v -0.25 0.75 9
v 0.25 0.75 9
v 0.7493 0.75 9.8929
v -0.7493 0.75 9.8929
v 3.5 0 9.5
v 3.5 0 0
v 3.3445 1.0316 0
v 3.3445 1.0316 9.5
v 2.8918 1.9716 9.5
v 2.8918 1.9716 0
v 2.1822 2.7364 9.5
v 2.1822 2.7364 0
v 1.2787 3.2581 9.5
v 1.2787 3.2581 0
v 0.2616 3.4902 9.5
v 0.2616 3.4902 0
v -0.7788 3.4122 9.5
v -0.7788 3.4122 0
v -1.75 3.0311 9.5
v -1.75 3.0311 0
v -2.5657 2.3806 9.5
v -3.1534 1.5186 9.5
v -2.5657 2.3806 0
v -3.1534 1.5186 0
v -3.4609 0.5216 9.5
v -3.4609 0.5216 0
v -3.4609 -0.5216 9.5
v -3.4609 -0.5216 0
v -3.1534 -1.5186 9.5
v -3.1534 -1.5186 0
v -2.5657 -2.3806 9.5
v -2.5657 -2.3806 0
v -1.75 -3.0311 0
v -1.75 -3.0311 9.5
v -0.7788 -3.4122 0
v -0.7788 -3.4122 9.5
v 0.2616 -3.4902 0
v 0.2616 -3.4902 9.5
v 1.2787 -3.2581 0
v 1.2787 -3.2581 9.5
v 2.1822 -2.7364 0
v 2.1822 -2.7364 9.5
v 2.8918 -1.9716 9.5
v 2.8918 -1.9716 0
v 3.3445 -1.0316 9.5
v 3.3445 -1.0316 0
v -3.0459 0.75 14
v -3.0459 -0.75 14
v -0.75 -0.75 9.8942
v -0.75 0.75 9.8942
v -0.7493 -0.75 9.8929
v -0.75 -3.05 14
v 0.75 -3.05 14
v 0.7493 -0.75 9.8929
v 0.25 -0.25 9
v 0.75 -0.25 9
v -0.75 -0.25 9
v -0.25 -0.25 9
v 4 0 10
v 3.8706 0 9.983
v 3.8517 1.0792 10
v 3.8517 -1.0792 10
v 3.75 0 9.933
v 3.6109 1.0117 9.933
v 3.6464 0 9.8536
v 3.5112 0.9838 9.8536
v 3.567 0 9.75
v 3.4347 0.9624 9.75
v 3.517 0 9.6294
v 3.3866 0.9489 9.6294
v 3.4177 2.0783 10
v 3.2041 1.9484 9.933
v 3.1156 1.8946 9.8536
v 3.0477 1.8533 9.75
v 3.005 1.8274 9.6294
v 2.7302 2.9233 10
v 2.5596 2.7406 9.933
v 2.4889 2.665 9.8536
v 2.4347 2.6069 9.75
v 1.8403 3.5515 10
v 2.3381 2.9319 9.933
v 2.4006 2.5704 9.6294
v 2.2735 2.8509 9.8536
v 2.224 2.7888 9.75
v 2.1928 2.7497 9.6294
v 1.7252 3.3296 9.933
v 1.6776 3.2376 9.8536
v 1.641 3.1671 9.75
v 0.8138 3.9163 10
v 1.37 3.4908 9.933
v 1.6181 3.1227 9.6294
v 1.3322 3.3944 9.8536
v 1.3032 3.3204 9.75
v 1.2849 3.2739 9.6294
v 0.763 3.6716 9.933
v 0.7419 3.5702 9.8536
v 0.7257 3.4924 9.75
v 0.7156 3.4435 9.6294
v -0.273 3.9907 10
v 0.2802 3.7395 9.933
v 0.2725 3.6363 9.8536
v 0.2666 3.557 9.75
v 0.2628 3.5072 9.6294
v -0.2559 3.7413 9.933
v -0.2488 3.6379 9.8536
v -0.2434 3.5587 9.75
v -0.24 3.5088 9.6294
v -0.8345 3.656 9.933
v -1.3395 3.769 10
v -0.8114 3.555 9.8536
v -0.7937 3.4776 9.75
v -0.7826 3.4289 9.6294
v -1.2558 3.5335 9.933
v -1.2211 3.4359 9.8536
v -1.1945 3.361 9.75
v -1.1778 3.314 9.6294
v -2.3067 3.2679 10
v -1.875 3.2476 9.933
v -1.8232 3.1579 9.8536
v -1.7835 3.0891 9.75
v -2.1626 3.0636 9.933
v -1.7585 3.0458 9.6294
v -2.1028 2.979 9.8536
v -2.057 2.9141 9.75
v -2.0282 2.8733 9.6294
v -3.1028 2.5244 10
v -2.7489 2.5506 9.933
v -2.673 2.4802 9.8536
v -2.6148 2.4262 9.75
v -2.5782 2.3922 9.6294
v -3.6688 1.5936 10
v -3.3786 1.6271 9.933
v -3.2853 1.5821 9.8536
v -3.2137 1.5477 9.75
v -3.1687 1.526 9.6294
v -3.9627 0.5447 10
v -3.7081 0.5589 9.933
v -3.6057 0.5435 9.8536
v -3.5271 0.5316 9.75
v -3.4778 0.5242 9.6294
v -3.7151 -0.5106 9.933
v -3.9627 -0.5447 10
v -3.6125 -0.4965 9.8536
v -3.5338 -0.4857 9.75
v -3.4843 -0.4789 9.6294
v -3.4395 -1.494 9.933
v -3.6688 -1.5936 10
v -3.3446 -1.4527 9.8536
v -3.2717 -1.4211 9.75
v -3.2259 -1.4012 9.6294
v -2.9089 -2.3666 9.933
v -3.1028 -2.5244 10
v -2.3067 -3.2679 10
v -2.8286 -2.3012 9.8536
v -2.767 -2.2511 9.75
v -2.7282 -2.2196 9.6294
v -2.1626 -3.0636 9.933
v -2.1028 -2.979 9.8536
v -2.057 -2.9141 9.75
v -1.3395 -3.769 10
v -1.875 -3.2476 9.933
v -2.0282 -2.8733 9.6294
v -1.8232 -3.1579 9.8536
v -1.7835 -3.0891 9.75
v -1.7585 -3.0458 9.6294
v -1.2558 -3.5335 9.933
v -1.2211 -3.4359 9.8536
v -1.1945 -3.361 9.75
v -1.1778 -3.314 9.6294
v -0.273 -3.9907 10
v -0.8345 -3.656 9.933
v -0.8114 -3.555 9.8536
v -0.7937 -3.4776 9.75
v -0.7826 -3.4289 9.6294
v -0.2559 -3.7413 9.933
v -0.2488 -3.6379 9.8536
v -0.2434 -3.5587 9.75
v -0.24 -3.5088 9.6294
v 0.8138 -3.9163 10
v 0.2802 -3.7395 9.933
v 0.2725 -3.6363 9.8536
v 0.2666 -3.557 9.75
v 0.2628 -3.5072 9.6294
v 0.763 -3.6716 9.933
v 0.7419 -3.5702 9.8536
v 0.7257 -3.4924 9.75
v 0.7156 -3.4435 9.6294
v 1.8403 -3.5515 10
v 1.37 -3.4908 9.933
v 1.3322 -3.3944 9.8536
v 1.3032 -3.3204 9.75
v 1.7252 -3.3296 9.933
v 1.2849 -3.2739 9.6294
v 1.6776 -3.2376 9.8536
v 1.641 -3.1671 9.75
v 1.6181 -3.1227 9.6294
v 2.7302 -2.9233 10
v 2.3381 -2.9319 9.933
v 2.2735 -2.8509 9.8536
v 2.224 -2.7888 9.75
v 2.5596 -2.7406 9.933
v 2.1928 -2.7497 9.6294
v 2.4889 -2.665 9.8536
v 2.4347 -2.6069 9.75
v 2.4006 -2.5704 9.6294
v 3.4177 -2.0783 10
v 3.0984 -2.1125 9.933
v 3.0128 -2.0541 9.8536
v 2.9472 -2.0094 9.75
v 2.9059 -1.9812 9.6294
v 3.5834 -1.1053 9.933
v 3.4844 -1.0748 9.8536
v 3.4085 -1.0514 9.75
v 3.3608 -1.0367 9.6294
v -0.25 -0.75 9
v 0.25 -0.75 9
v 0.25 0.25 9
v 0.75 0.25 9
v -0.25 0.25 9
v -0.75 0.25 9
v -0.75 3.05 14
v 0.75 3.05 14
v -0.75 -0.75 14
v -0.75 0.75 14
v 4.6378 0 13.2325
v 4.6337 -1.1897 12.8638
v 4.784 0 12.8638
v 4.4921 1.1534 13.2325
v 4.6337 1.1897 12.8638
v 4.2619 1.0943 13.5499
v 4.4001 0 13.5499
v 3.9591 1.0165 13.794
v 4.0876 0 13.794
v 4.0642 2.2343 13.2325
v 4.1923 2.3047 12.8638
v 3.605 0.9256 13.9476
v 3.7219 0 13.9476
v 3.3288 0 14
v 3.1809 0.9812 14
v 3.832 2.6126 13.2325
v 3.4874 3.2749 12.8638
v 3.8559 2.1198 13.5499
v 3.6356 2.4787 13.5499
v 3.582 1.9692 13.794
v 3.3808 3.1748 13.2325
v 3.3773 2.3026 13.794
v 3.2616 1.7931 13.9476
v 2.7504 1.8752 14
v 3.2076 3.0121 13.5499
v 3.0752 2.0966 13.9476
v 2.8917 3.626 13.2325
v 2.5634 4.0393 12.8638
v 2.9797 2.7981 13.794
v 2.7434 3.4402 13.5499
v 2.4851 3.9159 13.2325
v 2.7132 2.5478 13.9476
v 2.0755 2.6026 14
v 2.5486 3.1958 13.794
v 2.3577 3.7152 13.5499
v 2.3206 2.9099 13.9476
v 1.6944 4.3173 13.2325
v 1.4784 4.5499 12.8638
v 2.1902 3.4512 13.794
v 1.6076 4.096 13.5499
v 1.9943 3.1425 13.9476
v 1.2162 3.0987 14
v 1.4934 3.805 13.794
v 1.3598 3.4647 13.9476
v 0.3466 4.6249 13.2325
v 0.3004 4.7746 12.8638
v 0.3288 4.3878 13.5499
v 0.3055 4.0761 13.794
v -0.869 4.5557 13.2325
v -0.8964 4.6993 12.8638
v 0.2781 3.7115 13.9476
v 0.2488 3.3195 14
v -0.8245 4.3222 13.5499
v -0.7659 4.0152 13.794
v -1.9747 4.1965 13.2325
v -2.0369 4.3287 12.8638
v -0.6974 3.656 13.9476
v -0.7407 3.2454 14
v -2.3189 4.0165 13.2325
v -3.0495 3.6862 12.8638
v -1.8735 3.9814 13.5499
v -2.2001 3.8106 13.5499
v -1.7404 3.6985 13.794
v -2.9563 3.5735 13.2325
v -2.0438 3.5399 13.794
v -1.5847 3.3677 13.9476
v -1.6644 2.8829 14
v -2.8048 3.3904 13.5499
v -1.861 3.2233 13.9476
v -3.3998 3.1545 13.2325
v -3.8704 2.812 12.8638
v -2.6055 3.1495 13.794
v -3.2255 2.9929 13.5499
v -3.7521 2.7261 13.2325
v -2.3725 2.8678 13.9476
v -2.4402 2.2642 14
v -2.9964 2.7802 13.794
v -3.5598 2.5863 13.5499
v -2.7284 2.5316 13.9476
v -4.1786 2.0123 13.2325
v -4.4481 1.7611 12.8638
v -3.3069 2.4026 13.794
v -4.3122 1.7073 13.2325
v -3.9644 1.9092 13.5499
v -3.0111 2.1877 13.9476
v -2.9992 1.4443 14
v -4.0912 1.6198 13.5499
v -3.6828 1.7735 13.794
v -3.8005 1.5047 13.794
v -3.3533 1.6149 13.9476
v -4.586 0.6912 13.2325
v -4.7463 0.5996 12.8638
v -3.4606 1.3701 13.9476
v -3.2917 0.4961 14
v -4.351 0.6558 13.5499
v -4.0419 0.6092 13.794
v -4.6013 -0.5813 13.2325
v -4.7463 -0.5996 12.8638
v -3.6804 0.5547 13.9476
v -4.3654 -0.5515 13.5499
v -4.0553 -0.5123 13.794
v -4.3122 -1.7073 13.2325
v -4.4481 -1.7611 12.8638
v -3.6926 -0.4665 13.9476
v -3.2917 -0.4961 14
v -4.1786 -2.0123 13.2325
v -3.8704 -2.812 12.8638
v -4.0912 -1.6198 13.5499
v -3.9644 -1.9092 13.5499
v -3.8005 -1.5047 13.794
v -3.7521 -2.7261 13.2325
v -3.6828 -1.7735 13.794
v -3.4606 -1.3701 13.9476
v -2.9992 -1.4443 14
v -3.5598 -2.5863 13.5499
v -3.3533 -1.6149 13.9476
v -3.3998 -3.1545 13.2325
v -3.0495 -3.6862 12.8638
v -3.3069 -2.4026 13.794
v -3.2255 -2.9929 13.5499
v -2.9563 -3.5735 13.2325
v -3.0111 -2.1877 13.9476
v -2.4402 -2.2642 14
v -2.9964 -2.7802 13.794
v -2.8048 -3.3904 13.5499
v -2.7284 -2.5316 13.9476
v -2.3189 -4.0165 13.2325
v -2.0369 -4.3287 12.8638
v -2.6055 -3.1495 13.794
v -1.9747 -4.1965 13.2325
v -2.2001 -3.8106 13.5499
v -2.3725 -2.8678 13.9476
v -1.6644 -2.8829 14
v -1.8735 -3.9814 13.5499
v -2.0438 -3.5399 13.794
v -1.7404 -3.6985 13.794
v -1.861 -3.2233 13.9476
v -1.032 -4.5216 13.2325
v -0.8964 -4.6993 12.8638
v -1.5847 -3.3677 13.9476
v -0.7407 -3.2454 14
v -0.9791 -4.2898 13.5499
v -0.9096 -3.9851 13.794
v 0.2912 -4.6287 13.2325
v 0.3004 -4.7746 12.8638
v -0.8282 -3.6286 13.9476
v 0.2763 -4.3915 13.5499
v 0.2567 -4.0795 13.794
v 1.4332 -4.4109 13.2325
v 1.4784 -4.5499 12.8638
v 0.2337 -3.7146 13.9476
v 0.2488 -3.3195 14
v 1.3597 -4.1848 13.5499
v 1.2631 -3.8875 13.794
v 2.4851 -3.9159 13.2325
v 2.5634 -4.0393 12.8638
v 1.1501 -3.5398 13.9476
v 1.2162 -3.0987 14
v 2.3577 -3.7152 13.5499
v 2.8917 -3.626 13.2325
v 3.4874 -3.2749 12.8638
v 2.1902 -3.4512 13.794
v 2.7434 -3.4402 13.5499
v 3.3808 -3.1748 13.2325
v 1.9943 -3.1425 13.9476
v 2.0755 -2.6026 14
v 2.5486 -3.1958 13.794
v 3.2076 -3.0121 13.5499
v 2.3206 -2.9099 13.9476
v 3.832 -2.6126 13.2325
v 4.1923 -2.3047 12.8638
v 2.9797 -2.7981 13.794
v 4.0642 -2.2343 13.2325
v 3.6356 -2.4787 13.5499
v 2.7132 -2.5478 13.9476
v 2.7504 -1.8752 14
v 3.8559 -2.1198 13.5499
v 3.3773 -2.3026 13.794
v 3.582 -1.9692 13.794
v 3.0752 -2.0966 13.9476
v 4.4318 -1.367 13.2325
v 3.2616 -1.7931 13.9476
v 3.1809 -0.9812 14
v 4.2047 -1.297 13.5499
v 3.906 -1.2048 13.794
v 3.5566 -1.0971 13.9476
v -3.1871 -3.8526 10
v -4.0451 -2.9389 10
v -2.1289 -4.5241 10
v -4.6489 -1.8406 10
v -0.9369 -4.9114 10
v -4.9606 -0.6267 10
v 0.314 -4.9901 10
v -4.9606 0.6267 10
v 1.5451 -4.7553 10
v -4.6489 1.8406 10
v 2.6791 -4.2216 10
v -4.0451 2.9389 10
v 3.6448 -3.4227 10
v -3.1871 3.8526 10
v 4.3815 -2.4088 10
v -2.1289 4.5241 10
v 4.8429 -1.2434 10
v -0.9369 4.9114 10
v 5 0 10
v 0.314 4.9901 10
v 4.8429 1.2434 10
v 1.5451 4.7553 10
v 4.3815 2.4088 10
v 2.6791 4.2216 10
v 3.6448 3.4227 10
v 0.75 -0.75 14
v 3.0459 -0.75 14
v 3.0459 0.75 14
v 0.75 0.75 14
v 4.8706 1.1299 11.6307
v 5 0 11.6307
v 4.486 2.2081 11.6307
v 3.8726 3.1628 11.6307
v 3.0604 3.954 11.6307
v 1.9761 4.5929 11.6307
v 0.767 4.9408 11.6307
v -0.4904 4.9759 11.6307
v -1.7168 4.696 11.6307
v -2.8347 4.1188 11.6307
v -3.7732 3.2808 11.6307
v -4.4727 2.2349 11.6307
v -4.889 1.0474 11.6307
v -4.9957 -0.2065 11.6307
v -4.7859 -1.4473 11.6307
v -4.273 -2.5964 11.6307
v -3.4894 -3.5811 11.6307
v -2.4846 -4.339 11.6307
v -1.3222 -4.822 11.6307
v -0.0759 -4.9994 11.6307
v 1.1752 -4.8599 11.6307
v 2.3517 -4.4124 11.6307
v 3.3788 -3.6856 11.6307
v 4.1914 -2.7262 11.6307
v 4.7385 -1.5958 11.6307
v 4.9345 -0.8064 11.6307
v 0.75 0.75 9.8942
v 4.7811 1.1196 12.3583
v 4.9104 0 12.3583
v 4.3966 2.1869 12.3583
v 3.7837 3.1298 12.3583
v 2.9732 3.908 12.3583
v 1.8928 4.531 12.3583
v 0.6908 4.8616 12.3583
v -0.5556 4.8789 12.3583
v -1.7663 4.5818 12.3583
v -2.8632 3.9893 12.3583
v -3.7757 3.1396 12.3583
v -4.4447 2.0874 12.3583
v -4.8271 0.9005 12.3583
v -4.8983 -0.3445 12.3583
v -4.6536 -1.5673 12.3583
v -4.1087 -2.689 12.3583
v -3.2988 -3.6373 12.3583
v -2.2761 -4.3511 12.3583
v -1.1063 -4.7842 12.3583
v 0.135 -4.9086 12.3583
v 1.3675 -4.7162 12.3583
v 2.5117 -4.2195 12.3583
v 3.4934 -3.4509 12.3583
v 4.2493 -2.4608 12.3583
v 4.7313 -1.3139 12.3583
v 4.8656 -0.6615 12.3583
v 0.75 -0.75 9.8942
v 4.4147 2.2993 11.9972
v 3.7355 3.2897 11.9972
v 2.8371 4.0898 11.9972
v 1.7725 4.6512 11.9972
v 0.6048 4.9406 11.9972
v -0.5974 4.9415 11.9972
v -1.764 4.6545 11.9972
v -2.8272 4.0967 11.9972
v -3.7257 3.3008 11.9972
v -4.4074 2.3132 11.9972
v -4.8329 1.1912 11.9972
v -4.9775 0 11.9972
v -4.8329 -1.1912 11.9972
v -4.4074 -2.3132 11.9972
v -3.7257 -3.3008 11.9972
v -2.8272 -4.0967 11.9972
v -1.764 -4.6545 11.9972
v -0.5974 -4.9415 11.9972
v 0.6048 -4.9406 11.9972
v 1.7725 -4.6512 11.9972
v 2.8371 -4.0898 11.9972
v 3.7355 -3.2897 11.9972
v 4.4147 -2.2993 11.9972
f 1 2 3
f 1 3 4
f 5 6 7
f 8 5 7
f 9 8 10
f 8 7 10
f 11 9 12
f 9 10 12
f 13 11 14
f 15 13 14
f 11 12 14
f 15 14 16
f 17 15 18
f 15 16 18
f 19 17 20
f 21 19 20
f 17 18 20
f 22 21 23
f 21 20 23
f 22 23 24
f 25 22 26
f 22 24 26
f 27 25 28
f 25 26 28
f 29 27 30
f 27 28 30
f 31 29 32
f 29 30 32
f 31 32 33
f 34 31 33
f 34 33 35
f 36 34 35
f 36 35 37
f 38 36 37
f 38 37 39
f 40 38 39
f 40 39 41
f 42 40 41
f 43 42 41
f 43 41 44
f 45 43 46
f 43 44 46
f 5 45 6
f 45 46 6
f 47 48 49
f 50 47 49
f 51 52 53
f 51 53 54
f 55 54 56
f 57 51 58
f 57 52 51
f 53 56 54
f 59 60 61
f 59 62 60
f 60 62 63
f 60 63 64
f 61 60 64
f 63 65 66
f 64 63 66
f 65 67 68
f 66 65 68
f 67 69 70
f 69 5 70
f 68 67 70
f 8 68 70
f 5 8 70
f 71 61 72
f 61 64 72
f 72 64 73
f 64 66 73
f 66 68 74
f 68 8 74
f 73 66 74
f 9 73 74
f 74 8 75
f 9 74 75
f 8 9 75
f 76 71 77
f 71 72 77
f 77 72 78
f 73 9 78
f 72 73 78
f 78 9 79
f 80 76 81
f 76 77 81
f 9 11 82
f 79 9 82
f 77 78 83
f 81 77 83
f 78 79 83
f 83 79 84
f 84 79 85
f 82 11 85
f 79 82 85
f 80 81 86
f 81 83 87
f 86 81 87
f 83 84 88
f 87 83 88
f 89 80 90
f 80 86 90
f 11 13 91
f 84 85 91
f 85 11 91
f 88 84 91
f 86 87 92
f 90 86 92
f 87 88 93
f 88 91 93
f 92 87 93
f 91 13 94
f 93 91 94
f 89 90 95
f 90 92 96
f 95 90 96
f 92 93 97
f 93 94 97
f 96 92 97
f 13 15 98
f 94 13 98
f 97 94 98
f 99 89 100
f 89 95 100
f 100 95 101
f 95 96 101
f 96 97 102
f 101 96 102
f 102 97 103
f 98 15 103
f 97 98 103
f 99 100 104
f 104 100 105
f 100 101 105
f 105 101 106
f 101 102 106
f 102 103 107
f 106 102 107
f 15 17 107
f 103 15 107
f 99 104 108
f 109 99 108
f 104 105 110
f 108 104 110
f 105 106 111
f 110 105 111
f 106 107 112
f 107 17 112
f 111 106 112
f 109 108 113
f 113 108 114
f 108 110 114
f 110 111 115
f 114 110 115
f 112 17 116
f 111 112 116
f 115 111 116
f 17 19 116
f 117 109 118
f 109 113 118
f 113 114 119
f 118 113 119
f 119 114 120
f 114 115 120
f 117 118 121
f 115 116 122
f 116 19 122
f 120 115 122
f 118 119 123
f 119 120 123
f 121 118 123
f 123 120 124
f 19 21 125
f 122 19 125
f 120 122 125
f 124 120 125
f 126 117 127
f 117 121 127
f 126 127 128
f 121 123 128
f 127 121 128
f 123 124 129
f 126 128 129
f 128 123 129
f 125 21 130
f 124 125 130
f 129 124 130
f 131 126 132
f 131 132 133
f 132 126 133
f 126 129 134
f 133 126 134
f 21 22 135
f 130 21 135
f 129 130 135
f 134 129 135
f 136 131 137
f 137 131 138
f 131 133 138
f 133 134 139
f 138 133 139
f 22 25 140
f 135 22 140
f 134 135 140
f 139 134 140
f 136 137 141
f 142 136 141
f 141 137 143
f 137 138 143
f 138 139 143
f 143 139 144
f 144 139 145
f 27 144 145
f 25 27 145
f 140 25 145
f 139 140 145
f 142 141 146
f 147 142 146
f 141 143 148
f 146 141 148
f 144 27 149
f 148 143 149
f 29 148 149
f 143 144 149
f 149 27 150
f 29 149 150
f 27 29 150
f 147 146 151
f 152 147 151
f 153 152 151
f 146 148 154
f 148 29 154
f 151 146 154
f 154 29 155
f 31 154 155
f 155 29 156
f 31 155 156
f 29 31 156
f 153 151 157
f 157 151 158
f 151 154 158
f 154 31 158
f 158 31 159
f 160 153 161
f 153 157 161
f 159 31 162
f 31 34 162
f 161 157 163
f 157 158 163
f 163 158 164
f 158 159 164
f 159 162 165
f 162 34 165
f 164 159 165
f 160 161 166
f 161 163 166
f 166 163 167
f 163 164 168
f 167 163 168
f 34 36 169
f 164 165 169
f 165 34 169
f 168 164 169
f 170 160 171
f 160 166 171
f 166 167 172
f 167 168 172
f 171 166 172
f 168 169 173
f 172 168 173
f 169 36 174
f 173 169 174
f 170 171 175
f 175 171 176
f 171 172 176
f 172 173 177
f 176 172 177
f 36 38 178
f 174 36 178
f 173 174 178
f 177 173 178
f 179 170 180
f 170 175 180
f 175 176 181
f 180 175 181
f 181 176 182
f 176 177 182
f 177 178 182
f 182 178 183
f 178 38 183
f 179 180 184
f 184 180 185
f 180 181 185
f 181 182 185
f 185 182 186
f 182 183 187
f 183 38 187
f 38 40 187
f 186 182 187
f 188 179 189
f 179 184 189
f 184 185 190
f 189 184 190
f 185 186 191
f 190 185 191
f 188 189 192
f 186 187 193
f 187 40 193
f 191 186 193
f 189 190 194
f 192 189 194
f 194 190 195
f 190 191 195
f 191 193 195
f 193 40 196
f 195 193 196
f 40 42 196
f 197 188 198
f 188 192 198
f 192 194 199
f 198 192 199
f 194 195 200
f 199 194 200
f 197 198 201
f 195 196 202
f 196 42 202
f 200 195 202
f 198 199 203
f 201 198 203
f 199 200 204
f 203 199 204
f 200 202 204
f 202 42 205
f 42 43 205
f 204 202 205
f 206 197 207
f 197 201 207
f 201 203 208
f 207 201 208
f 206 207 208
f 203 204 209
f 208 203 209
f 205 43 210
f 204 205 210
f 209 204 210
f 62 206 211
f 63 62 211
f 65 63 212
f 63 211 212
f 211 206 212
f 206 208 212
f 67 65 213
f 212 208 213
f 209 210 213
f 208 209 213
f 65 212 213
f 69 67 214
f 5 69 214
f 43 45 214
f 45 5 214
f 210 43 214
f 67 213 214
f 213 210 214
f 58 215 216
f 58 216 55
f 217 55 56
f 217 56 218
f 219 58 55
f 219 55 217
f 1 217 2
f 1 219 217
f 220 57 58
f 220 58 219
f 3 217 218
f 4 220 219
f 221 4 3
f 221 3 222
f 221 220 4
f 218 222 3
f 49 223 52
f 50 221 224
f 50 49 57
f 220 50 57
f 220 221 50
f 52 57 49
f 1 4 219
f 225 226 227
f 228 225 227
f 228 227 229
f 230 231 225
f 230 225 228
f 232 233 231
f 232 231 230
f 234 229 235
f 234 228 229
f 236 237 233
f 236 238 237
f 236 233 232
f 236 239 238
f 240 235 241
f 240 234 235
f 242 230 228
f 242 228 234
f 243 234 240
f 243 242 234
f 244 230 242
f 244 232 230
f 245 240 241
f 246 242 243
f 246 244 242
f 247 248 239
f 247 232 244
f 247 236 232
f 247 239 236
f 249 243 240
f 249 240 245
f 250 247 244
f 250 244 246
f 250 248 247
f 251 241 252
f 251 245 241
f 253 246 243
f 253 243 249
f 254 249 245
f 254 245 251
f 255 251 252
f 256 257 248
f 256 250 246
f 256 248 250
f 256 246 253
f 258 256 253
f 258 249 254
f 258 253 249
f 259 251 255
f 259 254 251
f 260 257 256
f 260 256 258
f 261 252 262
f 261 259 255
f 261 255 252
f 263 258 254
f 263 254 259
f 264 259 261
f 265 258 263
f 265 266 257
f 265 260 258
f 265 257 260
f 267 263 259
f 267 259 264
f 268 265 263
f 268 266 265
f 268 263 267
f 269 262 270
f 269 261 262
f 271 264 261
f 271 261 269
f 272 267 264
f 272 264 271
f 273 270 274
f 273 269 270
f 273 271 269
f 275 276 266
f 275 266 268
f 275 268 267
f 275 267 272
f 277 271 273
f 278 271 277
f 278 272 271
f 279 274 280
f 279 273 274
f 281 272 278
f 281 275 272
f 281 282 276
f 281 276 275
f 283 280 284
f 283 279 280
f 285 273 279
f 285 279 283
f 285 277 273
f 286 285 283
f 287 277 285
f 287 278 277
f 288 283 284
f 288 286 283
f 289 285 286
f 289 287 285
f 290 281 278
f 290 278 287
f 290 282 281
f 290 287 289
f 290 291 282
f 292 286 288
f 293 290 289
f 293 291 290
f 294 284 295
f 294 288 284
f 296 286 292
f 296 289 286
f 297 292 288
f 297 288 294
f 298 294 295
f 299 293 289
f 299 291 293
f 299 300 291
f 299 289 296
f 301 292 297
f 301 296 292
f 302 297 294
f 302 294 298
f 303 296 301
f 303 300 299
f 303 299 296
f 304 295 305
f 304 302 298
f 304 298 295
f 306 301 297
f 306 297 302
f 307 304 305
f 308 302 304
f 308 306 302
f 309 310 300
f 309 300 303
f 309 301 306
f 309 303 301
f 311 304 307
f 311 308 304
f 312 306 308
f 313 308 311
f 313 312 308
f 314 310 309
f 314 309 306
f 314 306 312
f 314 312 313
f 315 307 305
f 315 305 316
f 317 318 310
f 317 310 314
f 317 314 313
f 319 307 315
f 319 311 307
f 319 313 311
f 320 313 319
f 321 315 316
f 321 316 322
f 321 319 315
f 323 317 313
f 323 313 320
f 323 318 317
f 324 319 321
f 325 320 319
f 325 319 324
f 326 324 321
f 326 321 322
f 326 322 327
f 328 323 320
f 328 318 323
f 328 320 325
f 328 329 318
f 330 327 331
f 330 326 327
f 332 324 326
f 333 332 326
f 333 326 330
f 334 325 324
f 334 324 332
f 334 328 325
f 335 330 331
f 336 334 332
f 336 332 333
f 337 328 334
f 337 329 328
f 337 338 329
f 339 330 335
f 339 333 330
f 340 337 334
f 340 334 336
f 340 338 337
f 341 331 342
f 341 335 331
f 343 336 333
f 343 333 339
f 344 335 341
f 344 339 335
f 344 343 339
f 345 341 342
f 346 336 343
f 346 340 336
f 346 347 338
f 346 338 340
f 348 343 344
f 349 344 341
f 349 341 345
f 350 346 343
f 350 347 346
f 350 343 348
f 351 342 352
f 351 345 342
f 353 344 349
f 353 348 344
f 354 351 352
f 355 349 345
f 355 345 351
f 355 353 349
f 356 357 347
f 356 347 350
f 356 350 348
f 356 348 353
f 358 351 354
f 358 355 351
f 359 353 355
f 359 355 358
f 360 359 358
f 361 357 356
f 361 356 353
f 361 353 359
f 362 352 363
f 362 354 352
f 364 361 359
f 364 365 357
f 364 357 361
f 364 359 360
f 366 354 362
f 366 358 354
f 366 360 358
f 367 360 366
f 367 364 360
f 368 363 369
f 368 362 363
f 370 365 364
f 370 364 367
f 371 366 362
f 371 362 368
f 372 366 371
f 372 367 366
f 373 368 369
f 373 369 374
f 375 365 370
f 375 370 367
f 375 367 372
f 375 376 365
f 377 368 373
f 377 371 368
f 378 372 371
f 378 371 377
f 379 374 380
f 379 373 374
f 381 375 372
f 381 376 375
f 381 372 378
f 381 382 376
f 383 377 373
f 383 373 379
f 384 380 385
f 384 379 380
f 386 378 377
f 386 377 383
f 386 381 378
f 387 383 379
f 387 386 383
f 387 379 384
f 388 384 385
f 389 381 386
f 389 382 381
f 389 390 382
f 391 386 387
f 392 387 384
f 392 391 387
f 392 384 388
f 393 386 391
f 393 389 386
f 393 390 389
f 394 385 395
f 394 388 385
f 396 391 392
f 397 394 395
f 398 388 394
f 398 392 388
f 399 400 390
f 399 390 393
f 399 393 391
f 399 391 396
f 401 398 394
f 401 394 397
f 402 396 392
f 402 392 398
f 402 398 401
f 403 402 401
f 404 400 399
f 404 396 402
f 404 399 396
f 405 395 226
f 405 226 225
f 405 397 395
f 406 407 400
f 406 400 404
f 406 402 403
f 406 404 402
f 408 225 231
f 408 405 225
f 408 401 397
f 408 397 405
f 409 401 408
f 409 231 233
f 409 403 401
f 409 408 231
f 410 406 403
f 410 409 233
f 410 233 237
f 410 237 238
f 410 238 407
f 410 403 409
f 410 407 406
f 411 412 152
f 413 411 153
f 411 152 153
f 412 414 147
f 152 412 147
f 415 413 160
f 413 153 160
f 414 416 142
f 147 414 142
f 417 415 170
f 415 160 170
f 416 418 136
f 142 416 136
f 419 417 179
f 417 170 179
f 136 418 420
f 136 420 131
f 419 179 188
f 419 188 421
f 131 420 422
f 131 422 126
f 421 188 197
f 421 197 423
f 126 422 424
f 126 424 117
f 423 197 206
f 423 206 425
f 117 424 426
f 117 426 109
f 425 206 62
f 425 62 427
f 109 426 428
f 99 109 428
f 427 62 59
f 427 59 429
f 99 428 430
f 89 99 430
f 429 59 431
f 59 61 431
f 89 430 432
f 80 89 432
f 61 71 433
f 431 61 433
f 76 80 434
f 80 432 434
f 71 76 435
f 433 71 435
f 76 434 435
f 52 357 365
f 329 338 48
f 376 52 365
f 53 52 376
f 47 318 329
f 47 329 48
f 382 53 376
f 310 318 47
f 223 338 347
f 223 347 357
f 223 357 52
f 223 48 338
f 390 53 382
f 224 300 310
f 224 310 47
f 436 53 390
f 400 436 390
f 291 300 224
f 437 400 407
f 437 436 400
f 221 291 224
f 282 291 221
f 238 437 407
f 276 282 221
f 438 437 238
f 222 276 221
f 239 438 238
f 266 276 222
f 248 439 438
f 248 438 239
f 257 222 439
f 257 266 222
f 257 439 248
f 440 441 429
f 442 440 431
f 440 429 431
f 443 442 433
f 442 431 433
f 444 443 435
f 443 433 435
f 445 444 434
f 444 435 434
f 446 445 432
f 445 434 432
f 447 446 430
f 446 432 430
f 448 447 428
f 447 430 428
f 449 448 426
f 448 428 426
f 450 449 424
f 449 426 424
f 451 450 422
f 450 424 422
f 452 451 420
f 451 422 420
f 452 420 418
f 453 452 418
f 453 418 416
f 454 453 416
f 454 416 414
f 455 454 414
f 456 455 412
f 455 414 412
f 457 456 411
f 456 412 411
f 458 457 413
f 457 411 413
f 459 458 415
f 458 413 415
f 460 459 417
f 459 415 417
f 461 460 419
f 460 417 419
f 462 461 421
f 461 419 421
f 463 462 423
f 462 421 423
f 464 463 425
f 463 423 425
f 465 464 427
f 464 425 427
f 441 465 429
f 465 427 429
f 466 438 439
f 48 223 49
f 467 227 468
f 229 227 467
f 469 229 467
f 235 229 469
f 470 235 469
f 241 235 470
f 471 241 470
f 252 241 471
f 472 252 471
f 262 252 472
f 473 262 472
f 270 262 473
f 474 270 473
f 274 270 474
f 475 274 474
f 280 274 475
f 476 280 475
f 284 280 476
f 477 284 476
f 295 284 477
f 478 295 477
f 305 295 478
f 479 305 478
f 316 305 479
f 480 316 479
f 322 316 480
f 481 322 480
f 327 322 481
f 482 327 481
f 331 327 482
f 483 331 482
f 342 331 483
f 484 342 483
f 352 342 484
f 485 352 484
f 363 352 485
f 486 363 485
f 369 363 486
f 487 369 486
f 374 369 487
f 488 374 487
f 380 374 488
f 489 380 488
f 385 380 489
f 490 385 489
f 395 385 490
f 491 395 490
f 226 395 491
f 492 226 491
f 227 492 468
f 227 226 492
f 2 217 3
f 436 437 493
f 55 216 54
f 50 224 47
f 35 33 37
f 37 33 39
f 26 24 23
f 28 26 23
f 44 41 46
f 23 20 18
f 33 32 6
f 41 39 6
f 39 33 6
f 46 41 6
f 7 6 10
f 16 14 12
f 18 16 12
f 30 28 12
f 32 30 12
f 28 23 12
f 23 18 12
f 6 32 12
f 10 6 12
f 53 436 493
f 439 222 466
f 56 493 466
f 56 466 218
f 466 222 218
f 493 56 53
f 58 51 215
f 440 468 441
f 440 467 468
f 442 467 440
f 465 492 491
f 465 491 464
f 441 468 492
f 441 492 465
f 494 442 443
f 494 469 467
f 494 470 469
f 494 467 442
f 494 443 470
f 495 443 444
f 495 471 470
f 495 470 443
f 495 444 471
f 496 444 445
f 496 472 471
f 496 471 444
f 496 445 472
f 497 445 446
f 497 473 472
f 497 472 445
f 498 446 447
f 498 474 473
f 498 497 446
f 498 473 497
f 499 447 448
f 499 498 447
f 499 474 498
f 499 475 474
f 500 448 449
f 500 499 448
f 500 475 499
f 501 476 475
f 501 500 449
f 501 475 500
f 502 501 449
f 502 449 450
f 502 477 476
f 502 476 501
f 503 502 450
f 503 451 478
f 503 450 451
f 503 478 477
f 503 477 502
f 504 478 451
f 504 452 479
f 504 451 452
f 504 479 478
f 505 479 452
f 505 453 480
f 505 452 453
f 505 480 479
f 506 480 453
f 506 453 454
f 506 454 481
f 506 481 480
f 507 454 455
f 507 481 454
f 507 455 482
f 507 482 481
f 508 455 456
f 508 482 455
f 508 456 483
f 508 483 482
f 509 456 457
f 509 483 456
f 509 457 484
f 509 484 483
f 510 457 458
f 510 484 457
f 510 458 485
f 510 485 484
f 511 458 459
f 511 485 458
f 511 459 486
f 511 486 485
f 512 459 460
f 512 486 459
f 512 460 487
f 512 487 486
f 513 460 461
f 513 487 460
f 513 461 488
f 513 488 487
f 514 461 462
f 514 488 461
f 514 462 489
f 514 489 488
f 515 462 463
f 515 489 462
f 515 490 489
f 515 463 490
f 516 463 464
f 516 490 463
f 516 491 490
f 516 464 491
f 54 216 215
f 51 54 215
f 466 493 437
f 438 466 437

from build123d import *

# Parameters (mm, degrees)
SZKIC1_R                        = 3.5
DODANIE_WYCI_GNI_CIE1_DEPTH     = 10
SZKIC3_R                        = 5
DODANIE_WYCI_GNI_CIE2_DEPTH     = 4
SFAZOWANIE2_SIZE                = 2
SFAZOWANIE2_SIZE2               = 0.5
ZAOKR_GLENIE1_R                 = 1.5
ZAOKR_GLENIE2_R                 = 3
ZAOKR_GLENIE3_R                 = 0.5
WYTNIJ_WYCI_GNI_CIE1_DEPTH      = 0.75
WYTNIJ_WYCI_GNI_CIE1_DEPTH_BACK = 0.75
WYTNIJ_WYCI_GNI_CIE2_DEPTH      = 0.75
WYTNIJ_WYCI_GNI_CIE2_DEPTH_BACK = 0.75


with BuildPart() as part:
    # Szkic1 → Dodanie-wyciągnięcie1 (new body)
    with BuildSketch(Plane.XY):
        Circle(SZKIC1_R)
    extrude(amount=DODANIE_WYCI_GNI_CIE1_DEPTH)

    # Szkic3 → Dodanie-wyciągnięcie2 (add)
    with BuildSketch(Plane.XY.offset(10)):
        Circle(SZKIC3_R)
    extrude(amount=DODANIE_WYCI_GNI_CIE2_DEPTH)

    # Sfazowanie2
    sfazowanie2_edges = [part.edges().sort_by_distance(p)[0] for p in [
        (-5, 0, 14),
    ]]
    sfazowanie2_side = [part.faces().sort_by_distance(p)[0] for p in [
        (-5, 0, 12),
    ]]
    chamfer(sfazowanie2_edges, length=SFAZOWANIE2_SIZE, length2=SFAZOWANIE2_SIZE2, reference=sfazowanie2_side[0])

    # Zaokrąglenie1
    zaokr_glenie1_edges = [part.edges().sort_by_distance(p)[0] for p in [
        (-4.5, 0, 14),
    ]]
    fillet(zaokr_glenie1_edges, radius=ZAOKR_GLENIE1_R)

    # Zaokrąglenie2
    zaokr_glenie2_edges = [part.edges().sort_by_distance(p)[0] for p in [
        (-5, 0, 12),
    ]]
    fillet(zaokr_glenie2_edges, radius=ZAOKR_GLENIE2_R)

    # Zaokrąglenie3
    zaokr_glenie3_edges = [part.edges().sort_by_distance(p)[0] for p in [
        (-3.5, 0, 10),
    ]]
    fillet(zaokr_glenie3_edges, radius=ZAOKR_GLENIE3_R)

    # Szkic4 → Wytnij-wyciągnięcie1 (cut, two sides: drawn at the far end of the back side and taken through both)
    with BuildSketch(Plane(origin=(0, 0, 0), x_dir=(1, 0, 0), z_dir=(0, 1, 0)).offset(-WYTNIJ_WYCI_GNI_CIE1_DEPTH_BACK)):
        Polygon((3.045898371, -14), (-3.045898371, -14), (-0.25, -9), (0, -9), (0.25, -9), align=None)
    extrude(amount=WYTNIJ_WYCI_GNI_CIE1_DEPTH + WYTNIJ_WYCI_GNI_CIE1_DEPTH_BACK, mode=Mode.SUBTRACT)

    # Szkic5 → Wytnij-wyciągnięcie2 (cut, two sides: drawn at the far end of the back side and taken through both)
    with BuildSketch(Plane(origin=(0, 0, 0), x_dir=(0, 0, -1), z_dir=(1, 0, 0)).offset(-WYTNIJ_WYCI_GNI_CIE2_DEPTH_BACK)):
        Polygon((-9, 0), (-9, 0.25), (-14, 3.05), (-14, -3.05), (-9, -0.25), align=None)
    extrude(amount=WYTNIJ_WYCI_GNI_CIE2_DEPTH + WYTNIJ_WYCI_GNI_CIE2_DEPTH_BACK, mode=Mode.SUBTRACT)


solid = part.part
